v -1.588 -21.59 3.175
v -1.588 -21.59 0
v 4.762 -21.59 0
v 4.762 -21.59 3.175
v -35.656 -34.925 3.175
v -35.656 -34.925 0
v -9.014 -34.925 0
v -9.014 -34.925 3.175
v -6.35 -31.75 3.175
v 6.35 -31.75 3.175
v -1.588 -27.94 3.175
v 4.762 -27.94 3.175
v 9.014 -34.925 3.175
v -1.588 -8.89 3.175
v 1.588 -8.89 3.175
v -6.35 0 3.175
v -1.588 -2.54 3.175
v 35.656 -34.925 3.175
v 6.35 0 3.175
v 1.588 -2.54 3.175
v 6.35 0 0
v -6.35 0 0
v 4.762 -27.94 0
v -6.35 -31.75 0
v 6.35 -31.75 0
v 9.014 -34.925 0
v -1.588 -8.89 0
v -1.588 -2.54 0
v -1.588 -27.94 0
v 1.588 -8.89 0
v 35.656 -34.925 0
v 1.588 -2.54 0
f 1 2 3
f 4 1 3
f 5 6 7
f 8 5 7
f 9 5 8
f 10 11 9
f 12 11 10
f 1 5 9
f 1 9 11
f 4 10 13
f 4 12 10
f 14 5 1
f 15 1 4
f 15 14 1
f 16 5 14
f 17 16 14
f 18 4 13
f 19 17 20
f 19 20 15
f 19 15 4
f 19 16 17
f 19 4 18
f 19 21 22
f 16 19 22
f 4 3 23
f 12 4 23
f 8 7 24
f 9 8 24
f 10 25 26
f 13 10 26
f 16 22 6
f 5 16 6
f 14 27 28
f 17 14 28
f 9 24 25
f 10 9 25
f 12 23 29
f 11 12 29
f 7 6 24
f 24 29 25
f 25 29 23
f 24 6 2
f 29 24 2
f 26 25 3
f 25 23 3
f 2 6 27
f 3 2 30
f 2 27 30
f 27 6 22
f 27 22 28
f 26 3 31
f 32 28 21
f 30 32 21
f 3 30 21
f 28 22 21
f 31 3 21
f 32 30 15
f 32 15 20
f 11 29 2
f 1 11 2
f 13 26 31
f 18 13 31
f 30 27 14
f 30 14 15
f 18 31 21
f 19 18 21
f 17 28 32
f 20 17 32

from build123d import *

# Parameters (mm, degrees)
F0_W     = 3.175
F0_H     = 6.35
F1_DEPTH = 3.175


# Not quite as in the source:
# - a length typed as a fraction of an inch, garbled in the dataset ("3 / 203.2 mm" for 3/8 in), is restored


with BuildPart() as f1:
    # F0 (on Top) → F1 (new body)
    with BuildSketch(Plane.XY):
        Polygon((6.35, 0), (-6.35, 0), (-35.6555546189, -34.925), (-9.014141329, -34.925), (-6.35, -31.75), (6.35, -31.75), (9.014141329, -34.925), (35.6555546189, -34.925), align=None)
        Polygon((-1.5875, -27.94), (-1.5875, -21.59), (1.5875, -21.59), (4.7625, -21.59), (4.7625, -27.94), (1.5875, -27.94), align=None, mode=Mode.SUBTRACT)
        with Locations((0, -5.715)):
            Rectangle(F0_W, F0_H, mode=Mode.SUBTRACT)
    extrude(amount=F1_DEPTH)


solid = f1.part
